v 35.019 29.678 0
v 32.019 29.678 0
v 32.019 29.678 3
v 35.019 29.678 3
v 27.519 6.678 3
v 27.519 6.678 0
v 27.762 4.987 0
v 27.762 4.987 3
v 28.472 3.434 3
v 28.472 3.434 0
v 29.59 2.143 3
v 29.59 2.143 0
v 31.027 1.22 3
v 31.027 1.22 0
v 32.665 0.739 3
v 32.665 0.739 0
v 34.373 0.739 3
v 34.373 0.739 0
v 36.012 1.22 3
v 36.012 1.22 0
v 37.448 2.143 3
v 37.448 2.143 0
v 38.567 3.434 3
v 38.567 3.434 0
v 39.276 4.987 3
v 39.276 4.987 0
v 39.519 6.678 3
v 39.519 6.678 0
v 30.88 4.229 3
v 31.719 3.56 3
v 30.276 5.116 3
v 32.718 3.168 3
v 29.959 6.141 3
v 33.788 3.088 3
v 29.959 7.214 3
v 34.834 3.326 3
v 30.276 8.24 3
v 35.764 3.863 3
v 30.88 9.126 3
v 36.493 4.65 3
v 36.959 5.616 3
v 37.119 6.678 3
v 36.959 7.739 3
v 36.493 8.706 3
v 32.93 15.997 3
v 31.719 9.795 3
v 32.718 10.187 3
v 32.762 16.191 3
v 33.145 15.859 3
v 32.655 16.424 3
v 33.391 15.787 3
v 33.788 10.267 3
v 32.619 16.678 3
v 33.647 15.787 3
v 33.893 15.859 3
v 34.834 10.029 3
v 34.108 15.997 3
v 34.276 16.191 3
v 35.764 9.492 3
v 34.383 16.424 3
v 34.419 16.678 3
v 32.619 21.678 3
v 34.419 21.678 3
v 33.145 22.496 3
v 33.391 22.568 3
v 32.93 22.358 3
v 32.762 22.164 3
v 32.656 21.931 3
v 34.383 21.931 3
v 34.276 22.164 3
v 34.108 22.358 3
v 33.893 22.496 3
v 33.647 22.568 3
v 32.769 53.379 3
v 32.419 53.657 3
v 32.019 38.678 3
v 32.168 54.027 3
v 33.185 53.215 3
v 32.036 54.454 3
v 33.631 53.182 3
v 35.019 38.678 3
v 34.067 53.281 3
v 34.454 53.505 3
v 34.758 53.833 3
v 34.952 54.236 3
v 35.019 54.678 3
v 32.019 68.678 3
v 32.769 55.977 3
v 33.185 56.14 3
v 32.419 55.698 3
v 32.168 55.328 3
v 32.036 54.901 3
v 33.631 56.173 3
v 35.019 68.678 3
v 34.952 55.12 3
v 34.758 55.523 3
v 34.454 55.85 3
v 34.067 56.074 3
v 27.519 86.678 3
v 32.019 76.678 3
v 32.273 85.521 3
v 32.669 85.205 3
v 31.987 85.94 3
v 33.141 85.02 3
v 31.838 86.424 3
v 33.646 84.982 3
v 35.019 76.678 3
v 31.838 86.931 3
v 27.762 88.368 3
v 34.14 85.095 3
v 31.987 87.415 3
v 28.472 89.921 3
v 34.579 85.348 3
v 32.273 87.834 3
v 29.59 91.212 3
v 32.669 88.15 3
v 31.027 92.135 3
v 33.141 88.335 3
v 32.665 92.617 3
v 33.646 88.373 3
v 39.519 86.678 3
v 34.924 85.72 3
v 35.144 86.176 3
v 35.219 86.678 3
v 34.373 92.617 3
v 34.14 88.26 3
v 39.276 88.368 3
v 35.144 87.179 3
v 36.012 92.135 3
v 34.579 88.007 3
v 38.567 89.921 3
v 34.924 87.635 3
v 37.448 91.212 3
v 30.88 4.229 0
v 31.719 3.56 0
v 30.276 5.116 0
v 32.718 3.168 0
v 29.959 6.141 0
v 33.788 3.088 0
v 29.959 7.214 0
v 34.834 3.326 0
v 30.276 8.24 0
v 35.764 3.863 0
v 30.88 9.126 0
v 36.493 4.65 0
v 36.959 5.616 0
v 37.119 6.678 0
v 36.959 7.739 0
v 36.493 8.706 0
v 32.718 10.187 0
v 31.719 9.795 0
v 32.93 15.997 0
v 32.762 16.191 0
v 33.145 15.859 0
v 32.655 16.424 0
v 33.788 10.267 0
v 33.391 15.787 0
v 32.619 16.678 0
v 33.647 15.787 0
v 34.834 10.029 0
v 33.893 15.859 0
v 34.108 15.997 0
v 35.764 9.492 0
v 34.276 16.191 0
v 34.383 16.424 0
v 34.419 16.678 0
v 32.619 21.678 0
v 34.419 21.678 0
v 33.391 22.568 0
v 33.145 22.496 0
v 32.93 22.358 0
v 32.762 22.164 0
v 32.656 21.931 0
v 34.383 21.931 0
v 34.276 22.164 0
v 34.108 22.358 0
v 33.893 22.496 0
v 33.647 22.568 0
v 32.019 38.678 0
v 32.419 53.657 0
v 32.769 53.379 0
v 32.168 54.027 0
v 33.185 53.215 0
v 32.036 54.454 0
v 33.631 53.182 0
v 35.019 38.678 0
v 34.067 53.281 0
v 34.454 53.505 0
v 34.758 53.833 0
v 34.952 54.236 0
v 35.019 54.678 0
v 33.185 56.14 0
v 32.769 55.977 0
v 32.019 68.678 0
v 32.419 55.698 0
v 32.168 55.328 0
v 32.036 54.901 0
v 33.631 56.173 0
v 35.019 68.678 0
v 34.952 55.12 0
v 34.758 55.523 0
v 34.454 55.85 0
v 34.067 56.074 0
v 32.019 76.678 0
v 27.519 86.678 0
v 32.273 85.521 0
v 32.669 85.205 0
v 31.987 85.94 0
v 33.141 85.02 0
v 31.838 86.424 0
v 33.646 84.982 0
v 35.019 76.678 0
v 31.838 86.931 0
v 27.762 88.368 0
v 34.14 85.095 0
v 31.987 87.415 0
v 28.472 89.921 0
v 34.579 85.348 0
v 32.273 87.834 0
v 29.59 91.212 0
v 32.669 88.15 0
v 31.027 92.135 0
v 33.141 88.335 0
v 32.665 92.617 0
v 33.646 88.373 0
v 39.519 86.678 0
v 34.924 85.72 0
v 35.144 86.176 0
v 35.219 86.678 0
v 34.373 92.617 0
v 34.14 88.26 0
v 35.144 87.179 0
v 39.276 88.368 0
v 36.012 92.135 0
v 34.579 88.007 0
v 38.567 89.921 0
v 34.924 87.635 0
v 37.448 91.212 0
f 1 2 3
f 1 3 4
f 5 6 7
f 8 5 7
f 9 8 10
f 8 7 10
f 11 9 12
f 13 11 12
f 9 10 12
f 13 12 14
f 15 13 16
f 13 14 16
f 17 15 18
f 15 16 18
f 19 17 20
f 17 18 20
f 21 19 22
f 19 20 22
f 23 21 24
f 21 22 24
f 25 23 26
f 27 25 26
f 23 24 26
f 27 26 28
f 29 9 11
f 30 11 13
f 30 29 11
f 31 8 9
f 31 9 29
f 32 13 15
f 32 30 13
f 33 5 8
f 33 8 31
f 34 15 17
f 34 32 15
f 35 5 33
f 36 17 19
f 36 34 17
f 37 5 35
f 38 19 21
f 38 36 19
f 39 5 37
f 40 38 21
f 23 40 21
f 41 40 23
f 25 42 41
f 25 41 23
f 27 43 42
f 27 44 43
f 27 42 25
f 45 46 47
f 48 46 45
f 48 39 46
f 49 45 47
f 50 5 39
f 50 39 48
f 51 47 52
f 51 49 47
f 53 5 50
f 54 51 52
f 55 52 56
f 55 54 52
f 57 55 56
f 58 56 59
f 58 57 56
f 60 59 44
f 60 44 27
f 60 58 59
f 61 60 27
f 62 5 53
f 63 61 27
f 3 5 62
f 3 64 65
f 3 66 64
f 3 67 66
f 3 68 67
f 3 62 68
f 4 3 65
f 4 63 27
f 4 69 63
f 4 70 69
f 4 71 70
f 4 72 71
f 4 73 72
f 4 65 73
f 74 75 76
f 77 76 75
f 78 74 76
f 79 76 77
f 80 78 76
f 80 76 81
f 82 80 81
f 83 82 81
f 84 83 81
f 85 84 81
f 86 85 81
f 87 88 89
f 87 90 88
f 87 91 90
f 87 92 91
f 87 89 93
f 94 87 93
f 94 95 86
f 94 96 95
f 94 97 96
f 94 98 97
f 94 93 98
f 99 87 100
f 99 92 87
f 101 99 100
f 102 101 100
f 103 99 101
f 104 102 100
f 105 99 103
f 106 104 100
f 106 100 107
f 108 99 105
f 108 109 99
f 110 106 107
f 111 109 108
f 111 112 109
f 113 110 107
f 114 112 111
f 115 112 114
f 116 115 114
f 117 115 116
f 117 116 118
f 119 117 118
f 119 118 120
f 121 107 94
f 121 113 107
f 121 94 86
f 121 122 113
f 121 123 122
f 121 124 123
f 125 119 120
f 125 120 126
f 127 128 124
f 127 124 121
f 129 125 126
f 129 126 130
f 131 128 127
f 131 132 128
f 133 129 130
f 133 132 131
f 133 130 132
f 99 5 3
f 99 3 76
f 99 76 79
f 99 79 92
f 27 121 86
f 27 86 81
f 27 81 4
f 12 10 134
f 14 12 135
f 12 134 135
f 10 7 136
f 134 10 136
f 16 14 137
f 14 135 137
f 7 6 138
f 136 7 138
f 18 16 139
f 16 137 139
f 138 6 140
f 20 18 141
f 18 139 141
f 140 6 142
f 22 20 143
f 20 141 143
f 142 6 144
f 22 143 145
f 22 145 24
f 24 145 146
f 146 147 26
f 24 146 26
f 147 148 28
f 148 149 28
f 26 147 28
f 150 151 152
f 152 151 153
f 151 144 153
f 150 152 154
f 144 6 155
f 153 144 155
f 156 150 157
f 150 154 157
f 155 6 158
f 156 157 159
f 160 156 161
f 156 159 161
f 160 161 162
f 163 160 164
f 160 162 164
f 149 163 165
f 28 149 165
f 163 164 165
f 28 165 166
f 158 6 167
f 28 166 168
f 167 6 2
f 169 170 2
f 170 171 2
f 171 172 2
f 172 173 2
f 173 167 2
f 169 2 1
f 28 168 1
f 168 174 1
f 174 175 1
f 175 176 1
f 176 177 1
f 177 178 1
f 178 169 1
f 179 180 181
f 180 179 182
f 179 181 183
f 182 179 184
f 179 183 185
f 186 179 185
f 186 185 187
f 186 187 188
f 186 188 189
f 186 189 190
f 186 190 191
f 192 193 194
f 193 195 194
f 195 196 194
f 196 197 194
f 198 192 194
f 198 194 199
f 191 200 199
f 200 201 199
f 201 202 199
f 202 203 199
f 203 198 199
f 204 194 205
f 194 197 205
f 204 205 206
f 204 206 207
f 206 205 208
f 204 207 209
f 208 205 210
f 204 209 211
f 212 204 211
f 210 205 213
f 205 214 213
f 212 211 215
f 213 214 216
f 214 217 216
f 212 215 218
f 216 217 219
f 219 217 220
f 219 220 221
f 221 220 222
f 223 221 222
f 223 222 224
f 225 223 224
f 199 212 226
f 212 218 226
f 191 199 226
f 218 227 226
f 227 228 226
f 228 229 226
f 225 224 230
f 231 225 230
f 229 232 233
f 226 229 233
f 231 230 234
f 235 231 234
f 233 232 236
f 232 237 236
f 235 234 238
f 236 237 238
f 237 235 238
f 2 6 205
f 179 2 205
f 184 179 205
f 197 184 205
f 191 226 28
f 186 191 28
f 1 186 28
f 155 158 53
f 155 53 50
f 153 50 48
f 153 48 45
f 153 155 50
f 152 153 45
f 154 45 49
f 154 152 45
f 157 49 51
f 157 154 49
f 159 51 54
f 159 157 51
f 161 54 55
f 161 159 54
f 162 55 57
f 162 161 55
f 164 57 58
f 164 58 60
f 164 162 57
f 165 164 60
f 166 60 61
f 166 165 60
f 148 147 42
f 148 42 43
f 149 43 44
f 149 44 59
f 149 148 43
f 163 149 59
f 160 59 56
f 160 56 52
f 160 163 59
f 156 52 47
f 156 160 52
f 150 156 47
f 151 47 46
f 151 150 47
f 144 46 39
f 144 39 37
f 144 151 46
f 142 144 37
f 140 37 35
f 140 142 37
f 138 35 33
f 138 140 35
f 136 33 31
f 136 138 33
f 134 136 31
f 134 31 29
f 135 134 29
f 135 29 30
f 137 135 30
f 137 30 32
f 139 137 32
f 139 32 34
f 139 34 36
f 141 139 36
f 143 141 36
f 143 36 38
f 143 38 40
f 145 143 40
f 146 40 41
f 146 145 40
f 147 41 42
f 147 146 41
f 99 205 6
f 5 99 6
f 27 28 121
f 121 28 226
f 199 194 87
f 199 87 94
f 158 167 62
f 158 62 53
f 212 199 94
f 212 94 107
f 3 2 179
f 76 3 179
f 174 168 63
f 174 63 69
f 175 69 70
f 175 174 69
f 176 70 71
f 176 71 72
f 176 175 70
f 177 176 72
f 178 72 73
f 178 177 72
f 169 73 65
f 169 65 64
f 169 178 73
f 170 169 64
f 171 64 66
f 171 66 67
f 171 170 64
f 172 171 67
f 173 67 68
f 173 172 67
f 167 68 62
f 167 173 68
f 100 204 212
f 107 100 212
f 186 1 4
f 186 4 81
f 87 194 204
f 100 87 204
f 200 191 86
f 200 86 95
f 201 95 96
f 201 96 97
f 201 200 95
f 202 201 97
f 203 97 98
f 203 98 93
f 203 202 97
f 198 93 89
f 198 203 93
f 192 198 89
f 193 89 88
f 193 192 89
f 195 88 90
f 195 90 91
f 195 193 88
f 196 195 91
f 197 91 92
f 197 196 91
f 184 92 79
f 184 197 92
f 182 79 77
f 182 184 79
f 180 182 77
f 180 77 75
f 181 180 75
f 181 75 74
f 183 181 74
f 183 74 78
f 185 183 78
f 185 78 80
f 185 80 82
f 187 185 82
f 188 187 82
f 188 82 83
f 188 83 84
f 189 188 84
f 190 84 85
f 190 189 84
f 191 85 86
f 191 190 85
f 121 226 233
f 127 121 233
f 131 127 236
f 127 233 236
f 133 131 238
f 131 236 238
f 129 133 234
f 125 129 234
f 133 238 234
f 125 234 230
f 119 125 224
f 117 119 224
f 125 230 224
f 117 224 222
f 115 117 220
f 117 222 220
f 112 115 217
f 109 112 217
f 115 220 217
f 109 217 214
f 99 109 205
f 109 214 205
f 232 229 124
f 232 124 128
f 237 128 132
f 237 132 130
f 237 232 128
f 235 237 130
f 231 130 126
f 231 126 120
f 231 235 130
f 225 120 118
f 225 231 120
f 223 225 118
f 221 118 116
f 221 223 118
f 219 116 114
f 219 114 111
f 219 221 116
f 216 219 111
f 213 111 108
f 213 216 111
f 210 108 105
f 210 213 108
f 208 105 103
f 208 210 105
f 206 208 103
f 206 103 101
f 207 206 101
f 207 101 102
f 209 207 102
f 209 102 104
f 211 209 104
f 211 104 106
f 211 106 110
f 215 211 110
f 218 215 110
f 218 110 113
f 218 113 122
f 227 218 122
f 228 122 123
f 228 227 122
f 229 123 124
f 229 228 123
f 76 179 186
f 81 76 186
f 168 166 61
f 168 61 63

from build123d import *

# Parameters (mm, degrees)
MODEL_R             = 3.6
MODEL_R_2           = 1.7
MODEL_R_3           = 1.500000002
MODEL_W             = 3
MODEL_H             = 9
MODEL_H_2           = 8
BOSS_EXTRUDE1_DEPTH = 3


with BuildPart() as part:
    # Model → Boss-Extrude1 (new body)
    with BuildSketch(Plane.XY):
        with BuildLine():
            Line((39.51904, 20.352307471), (39.51904, 75.773102336))
            Line((39.51904, 75.773102336), (39.51904, 86.677548788))
            ThreePointArc((39.51904, 86.677548788), (33.51909, 92.677598788), (27.51904, 86.677648789))
            Line((27.51904, 86.677648789), (27.51904, 6.677548789))
            ThreePointArc((27.51904, 6.677548789), (33.519039999, 0.677548789), (39.51904, 6.677548789))
            Line((39.51904, 6.677548789), (39.51904, 20.352307471))
        make_face()
        with Locations((33.519039999, 6.677548788)):
            Circle(MODEL_R, mode=Mode.SUBTRACT)
        with Locations((33.519039998, 86.677548787)):
            Circle(MODEL_R_2, mode=Mode.SUBTRACT)
        with Locations((33.519040002, 54.677648787)):
            Circle(MODEL_R_3, mode=Mode.SUBTRACT)
        with Locations((33.51904, 34.177548789)):
            Rectangle(MODEL_W, MODEL_H, mode=Mode.SUBTRACT)
        with Locations((33.51904, 72.677548789)):
            Rectangle(MODEL_W, MODEL_H_2, mode=Mode.SUBTRACT)
        with BuildLine():
            Line((32.61904, 21.677648789), (32.61904, 16.677548789))
            ThreePointArc((32.61904, 16.677548789), (33.51904, 15.777548789), (34.41904, 16.677548789))
            Line((34.41904, 16.677548789), (34.41904, 21.677548786))
            ThreePointArc((34.41904, 21.677548786), (33.519090001, 22.577598787), (32.61904, 21.677648789))
        make_face(mode=Mode.SUBTRACT)
    extrude(amount=BOSS_EXTRUDE1_DEPTH)


solid = part.part
